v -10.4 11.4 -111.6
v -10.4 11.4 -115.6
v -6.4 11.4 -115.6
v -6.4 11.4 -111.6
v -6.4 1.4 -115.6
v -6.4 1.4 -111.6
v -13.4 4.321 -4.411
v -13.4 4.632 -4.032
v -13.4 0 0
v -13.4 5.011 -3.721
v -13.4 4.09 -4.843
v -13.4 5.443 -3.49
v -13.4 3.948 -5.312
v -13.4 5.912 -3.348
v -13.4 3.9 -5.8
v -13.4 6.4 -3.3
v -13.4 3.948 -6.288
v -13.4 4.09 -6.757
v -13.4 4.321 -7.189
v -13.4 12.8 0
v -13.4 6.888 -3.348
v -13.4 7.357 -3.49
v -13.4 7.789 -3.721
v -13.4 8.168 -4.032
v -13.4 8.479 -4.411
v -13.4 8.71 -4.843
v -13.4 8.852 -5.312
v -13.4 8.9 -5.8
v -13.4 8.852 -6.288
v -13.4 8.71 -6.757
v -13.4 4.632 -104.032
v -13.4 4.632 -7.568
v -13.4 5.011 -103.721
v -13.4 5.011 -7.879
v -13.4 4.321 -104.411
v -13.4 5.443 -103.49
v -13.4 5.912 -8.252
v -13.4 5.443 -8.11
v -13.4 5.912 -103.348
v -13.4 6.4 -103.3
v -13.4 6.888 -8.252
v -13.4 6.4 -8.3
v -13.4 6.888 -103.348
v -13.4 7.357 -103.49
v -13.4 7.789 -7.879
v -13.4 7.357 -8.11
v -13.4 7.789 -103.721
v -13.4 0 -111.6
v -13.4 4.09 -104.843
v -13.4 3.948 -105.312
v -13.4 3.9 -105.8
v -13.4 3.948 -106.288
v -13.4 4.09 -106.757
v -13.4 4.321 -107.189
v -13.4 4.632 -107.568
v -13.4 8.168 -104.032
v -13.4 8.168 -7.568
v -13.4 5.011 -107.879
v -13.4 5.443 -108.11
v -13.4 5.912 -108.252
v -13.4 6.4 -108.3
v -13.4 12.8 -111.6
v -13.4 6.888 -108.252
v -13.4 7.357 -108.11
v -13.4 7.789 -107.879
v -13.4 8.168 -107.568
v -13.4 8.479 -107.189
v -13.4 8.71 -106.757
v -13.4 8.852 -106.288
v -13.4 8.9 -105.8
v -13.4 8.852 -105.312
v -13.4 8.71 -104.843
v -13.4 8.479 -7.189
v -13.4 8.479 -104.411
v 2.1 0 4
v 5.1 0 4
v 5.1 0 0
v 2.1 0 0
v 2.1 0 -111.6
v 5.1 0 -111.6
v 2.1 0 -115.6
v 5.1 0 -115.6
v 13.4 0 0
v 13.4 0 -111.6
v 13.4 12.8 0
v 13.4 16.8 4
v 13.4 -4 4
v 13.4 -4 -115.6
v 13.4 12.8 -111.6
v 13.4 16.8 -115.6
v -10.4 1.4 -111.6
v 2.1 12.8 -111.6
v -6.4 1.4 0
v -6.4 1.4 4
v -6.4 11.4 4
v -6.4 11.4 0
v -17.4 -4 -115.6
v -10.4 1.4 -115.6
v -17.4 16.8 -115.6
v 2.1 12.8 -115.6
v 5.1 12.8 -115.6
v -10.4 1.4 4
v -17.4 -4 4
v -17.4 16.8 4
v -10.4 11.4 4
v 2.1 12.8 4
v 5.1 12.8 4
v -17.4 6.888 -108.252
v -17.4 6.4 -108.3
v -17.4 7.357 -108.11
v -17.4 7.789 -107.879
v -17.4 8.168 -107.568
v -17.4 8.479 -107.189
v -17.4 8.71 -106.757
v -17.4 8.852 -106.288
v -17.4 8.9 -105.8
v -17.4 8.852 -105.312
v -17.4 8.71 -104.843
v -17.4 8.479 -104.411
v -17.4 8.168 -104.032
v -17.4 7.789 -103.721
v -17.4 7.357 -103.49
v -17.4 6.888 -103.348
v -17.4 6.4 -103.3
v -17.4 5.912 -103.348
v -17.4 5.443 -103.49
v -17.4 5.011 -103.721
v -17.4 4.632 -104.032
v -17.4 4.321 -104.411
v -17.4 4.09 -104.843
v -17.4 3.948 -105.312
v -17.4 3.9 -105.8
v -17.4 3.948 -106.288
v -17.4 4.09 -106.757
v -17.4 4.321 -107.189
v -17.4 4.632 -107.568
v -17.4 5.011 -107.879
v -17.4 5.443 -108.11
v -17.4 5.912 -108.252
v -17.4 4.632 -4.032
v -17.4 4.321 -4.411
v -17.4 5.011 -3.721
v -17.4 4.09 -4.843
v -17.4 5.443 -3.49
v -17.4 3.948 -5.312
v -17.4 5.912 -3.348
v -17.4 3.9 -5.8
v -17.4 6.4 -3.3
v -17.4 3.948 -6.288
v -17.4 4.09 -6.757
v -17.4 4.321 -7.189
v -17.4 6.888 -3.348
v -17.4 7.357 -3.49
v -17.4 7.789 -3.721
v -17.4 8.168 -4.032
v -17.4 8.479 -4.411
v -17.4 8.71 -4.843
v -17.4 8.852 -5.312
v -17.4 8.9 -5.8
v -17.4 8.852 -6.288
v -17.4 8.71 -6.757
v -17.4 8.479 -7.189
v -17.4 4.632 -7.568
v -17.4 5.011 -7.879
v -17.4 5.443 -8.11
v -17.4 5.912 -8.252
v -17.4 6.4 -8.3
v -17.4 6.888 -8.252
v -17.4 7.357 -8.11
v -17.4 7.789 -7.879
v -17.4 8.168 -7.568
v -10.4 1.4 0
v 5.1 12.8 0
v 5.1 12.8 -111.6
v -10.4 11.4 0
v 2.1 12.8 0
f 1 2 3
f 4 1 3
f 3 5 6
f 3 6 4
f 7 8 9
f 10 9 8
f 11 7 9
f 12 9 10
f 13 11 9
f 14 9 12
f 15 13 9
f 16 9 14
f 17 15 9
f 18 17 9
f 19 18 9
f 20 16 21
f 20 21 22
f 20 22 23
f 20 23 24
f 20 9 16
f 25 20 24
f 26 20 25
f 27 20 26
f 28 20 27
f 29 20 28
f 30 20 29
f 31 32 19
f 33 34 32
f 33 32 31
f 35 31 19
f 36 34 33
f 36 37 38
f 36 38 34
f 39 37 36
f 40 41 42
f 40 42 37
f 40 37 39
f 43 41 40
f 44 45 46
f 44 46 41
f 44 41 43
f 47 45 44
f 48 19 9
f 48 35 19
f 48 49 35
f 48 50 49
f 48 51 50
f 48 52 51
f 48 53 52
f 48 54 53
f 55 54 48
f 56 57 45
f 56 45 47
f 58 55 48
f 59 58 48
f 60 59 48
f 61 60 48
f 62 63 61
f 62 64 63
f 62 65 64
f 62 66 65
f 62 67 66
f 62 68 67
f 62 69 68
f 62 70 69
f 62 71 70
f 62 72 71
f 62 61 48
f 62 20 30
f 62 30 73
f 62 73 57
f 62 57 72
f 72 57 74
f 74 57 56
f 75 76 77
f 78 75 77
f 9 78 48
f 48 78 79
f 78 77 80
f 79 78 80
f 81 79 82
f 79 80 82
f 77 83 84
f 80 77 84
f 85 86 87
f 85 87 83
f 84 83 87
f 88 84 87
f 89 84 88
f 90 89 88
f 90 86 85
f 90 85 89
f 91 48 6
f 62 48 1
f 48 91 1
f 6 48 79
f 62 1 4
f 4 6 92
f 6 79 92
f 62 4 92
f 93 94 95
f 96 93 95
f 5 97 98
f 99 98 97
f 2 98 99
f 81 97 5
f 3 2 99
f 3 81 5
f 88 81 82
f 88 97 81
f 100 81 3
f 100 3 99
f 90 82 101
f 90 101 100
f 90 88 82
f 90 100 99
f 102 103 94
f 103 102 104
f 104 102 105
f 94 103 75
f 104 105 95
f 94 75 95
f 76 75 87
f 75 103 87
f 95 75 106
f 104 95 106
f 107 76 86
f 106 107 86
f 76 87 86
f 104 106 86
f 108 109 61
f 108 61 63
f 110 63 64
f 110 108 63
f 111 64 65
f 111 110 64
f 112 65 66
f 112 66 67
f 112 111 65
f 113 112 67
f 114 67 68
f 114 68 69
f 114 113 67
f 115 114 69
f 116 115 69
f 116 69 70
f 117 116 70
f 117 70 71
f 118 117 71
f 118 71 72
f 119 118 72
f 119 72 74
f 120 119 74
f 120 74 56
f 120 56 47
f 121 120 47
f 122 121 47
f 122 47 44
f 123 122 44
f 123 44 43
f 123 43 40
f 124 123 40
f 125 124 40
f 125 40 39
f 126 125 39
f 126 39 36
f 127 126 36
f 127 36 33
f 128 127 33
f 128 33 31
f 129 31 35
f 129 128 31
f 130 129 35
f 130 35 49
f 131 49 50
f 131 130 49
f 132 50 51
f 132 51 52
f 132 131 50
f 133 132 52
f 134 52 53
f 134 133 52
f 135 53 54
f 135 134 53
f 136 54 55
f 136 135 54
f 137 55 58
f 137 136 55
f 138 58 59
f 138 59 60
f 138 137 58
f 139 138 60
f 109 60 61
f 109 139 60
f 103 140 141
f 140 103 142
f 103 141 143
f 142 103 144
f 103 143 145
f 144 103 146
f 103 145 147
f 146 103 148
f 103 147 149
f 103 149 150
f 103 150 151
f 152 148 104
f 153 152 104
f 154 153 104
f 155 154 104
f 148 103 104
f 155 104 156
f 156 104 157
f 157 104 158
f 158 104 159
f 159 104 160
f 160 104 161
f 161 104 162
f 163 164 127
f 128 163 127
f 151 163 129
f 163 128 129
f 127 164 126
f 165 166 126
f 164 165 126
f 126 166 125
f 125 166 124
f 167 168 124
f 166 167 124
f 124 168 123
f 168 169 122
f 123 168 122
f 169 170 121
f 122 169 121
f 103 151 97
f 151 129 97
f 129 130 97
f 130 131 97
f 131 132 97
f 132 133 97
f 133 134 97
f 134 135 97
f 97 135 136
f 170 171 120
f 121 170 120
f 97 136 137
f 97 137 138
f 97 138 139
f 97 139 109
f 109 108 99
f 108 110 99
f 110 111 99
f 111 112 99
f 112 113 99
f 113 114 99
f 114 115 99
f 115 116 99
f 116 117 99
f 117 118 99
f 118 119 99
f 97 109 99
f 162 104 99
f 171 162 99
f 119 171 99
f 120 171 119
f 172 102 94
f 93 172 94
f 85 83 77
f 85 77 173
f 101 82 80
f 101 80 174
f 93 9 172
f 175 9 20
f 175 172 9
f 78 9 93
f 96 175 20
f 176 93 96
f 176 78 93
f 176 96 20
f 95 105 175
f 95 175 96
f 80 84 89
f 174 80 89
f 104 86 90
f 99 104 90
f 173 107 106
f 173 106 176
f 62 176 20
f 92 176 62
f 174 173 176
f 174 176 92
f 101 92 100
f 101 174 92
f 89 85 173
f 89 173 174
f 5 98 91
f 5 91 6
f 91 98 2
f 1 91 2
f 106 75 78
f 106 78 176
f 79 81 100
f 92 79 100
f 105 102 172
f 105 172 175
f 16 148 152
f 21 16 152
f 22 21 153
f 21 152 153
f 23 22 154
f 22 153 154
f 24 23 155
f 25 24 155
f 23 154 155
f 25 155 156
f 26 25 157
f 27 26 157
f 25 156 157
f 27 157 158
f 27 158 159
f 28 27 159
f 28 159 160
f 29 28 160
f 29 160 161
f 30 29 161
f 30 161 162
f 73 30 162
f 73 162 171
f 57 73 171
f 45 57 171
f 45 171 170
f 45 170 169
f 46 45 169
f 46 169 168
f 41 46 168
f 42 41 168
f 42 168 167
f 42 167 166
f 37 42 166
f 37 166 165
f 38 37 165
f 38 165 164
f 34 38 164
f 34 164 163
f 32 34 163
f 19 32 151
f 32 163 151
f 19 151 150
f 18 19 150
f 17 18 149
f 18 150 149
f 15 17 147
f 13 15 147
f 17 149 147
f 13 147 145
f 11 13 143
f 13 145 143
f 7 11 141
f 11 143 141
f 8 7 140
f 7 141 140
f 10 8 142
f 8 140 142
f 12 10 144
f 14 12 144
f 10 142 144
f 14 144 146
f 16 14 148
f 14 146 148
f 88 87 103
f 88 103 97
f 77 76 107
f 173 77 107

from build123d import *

# Parameters (mm, degrees)
SKETCH2_W               = 111.6
SKETCH2_H               = 12.8
ARM_DEPTH               = 13.4
SHELL_T                 = 4
PIVOT_PEG_HOLE_REACH    = 122.807
SKETCH3_R               = 2.5
CABLE_PASSTHROUGH_REACH = 124.021
SKETCH4_W               = 3
SKETCH4_H               = 12.8
SKETCH4_W_2             = 4
SKETCH4_H_2             = 10


with BuildPart() as part:
    # Sketch2 → arm (new, symmetric)
    with BuildSketch(Plane(origin=(0, 0, 0), x_dir=(0, 0, -1), z_dir=(1, 0, 0))):
        with Locations((55.8, 6.4)):
            Rectangle(SKETCH2_W, SKETCH2_H)
    extrude(amount=ARM_DEPTH, both=True)

    # shell
    shell_openings = [part.faces().sort_by_distance(p)[0] for p in [
        (13.4, 6.4, -55.8),
    ]]
    offset(amount=SHELL_T, openings=shell_openings, kind=Kind.INTERSECTION)

    # Sketch3 → pivot peg hole (cut, up to next)
    with BuildSketch(Plane.ZY.offset(17.4), mode=Mode.PRIVATE) as pivot_peg_hole_sk1:
        with Locations((-5.8, 6.4)):
            Circle(SKETCH3_R)
    pivot_peg_hole_tool1 = extrude(pivot_peg_hole_sk1.sketch, amount=-PIVOT_PEG_HOLE_REACH, mode=Mode.PRIVATE) & part.part
    pivot_peg_hole = pivot_peg_hole_tool1.solids().sort_by_distance((-17.4, 6.4, -5.8))[0]
    add(pivot_peg_hole, mode=Mode.SUBTRACT)

    # Sketch4 → cable passthrough (cut, up to next)
    with BuildSketch(Plane.XY.offset(4), mode=Mode.PRIVATE) as cable_passthrough_sk1:
        with Locations((3.6, 6.4)):
            Rectangle(SKETCH4_W, SKETCH4_H)
    cable_passthrough_tool1 = extrude(cable_passthrough_sk1.sketch, amount=-CABLE_PASSTHROUGH_REACH, mode=Mode.PRIVATE) & part.part
    # Sketch4 → cable passthrough (cut, up to next)
    with BuildSketch(Plane.XY.offset(4), mode=Mode.PRIVATE) as cable_passthrough_sk2:
        with Locations((-8.4, 6.4)):
            Rectangle(SKETCH4_W_2, SKETCH4_H_2)
    cable_passthrough_tool2 = extrude(cable_passthrough_sk2.sketch, amount=-CABLE_PASSTHROUGH_REACH, mode=Mode.PRIVATE) & part.part
    cable_passthrough_1 = cable_passthrough_tool1.solids().sort_by_distance((3.6, 6.4, 4))[0]
    add(cable_passthrough_1, mode=Mode.SUBTRACT)
    cable_passthrough_2 = cable_passthrough_tool2.solids().sort_by_distance((-8.4, 6.4, 4))[0]
    add(cable_passthrough_2, mode=Mode.SUBTRACT)
    cable_passthrough = cable_passthrough_1 + cable_passthrough_2  # cable passthrough as one shape, for the pattern or mirror that repeats it

    # elbow mount: pivot peg hole, cable passthrough across plane
    add(pivot_peg_hole.mirror(Plane.XY.offset(-55.8)), mode=Mode.SUBTRACT)
    add(cable_passthrough.mirror(Plane.XY.offset(-55.8)), mode=Mode.SUBTRACT)


solid = part.part
